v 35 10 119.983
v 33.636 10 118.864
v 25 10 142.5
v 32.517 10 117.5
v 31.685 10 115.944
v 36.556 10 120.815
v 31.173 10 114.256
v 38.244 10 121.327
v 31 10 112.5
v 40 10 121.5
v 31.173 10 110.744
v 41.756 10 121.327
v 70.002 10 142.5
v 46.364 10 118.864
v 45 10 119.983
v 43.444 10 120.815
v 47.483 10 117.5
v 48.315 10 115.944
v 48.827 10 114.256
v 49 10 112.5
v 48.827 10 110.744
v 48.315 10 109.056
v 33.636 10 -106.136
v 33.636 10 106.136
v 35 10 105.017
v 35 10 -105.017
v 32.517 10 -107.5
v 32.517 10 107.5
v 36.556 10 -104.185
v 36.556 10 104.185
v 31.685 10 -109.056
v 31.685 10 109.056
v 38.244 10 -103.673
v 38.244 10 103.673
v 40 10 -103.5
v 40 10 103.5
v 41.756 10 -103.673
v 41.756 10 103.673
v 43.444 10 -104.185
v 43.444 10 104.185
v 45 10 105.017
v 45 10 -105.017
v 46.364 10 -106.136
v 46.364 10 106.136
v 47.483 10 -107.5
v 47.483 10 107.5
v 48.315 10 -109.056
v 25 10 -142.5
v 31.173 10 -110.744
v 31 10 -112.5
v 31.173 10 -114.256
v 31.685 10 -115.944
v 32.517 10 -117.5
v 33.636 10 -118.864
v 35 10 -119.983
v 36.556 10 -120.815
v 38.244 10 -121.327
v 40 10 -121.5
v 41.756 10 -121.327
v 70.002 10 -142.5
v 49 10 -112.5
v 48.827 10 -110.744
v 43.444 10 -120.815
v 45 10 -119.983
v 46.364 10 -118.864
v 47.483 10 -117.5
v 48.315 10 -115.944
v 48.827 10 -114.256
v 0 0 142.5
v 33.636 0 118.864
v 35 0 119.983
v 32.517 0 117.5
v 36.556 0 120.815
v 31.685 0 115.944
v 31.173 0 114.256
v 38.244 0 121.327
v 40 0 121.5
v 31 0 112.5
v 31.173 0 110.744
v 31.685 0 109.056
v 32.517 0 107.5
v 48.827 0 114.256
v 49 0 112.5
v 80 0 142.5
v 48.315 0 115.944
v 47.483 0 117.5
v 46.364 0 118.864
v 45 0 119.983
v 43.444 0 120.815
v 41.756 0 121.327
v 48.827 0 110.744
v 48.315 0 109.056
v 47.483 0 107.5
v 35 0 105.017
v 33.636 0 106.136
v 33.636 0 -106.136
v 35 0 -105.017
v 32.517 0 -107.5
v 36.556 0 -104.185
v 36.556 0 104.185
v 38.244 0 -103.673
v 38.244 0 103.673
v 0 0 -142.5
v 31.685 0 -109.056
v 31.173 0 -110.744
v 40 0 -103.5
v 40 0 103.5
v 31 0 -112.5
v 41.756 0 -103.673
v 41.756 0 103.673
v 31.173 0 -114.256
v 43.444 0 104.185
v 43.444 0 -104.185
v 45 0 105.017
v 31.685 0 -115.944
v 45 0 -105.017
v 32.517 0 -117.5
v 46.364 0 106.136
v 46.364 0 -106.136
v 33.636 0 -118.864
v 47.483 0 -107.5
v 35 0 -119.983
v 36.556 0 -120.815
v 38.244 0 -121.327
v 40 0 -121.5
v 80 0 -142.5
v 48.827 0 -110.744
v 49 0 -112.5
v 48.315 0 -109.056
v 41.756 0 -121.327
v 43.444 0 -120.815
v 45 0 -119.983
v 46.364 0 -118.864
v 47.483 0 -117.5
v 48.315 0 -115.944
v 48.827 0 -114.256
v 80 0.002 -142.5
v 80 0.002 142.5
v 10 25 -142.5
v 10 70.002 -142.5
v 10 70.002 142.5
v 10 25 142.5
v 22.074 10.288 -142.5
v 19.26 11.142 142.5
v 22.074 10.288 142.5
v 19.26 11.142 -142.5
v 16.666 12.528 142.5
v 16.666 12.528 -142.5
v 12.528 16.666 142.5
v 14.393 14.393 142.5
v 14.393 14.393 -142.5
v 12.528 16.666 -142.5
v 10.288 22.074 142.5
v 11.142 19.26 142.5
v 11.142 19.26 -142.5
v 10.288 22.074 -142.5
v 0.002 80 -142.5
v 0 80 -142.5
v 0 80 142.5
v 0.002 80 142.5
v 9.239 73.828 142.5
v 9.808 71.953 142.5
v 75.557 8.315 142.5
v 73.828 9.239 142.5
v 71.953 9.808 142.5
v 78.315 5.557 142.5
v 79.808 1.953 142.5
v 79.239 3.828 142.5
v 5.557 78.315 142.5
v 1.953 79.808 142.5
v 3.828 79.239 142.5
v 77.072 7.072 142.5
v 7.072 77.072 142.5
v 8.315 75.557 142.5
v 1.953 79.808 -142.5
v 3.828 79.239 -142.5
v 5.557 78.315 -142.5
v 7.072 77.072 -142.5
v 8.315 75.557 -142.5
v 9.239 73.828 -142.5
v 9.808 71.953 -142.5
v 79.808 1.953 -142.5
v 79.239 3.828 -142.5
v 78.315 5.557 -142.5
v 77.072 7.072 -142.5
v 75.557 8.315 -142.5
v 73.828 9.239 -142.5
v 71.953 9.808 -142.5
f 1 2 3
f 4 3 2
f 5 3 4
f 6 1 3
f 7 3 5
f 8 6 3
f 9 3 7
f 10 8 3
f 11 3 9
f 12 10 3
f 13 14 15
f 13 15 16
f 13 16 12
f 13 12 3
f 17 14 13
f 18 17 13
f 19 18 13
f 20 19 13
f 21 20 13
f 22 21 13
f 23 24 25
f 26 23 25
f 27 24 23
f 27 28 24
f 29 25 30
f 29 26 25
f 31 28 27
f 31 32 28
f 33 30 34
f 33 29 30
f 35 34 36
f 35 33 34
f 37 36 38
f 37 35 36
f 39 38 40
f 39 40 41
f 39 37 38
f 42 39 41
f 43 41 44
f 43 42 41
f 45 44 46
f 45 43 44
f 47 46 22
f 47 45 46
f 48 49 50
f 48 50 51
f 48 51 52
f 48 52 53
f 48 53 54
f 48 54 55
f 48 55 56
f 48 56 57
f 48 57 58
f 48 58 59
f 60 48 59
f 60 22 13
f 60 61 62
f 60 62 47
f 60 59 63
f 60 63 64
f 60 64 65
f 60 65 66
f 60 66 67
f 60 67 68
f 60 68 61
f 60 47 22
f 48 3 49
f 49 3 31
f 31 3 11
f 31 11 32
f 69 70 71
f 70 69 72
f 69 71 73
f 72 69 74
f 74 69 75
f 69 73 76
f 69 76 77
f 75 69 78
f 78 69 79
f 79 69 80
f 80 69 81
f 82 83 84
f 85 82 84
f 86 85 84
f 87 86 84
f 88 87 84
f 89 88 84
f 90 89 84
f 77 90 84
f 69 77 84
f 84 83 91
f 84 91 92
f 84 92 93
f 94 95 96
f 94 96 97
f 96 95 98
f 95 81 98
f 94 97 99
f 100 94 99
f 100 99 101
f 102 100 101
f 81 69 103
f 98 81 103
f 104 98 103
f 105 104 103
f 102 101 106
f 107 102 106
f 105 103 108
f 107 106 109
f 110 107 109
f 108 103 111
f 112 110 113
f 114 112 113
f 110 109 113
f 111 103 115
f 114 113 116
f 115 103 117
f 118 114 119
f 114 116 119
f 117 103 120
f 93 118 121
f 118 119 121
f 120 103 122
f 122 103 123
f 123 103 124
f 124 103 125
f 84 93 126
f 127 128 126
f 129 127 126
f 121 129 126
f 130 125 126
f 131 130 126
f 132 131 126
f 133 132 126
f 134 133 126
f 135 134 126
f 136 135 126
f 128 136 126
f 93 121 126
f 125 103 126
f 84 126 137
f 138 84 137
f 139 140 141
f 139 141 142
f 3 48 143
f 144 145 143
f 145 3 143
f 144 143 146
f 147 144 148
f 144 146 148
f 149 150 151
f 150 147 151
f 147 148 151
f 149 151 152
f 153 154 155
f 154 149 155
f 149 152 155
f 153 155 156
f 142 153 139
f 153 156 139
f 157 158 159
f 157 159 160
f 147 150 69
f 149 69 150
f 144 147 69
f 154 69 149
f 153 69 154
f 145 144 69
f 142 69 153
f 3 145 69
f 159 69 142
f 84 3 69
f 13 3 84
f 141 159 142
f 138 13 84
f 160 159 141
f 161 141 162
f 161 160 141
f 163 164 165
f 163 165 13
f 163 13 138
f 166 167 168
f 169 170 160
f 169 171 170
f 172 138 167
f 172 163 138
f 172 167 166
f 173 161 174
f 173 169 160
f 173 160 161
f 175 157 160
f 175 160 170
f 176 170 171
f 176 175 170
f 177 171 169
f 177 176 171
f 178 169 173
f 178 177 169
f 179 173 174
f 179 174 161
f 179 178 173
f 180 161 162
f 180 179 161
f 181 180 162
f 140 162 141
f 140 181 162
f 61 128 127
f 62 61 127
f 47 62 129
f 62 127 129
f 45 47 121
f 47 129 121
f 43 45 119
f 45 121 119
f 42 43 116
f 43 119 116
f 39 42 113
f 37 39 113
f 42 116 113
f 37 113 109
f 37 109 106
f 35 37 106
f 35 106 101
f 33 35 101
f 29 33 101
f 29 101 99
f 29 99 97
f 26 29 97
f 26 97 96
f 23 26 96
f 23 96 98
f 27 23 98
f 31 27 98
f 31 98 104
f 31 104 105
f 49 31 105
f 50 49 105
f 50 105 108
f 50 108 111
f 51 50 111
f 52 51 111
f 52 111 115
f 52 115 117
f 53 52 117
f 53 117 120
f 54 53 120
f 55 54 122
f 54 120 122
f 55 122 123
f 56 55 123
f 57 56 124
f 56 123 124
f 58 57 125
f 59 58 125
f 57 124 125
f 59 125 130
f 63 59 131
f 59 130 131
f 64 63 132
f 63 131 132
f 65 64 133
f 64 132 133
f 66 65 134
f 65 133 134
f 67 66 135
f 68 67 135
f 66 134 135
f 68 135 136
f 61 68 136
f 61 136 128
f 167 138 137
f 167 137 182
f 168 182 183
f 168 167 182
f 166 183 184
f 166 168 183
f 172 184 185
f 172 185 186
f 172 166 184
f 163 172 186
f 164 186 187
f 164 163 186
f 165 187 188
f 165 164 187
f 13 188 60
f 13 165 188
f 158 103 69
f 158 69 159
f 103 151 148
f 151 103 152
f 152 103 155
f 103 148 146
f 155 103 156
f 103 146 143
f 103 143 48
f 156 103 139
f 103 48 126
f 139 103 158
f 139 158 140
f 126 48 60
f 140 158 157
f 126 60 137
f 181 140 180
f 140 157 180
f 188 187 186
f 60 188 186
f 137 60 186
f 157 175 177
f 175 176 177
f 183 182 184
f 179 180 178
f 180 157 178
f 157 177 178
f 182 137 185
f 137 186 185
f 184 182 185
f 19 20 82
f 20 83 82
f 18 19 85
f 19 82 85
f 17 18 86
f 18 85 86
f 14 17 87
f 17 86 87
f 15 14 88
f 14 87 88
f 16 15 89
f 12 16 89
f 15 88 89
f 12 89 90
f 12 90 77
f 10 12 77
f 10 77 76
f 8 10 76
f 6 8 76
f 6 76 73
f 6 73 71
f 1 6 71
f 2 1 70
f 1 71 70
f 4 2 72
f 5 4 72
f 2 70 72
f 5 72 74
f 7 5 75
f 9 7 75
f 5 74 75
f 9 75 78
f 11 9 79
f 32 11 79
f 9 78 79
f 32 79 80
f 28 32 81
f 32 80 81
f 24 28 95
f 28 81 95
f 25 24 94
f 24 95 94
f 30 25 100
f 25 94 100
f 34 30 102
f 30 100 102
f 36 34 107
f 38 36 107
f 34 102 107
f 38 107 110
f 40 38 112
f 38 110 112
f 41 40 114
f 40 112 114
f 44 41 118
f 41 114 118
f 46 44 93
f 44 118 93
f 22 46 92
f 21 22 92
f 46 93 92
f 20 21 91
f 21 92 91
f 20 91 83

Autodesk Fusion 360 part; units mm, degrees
sketch "Sketch1" plane through (0, 0, 0) normal (0, 0, 1) x (1, 0, 0)
  line L0 (0, 0) -> (80, 0)
  line L1 (0, 0) -> (0, 80)
  line L2 (0, 80) -> (10, 80)
  line L3 (80, 0) -> (80, 10)
  line L4 (10, 80) -> (10, 10)
  line L5 (10, 10) -> (80, 10)
  dimension "d1" = 80
  dimension "d2" = 80
  dimension "d3" = 10
  dimension "d4" = 10
extrude "Extrude1" add sketch "Sketch1" along normal mid plane 285
fillet "Fillet1" radius 10 2 edges at (80, 10, 0) (10, 80, 0)
fillet "Fillet2" radius 15 1 edges at (10, 10, 0)
sketch "Sketch2" plane through (0, 0, 0) normal (0, -1, 0) x (1, 0, 0)
  line L0 (80, -142.5) -> (80, 142.5)
  line L1 (80, 142.5) -> (0, 142.5)
  line L2 (0, 142.5) -> (0, -142.5)
  line L3 (0, -142.5) -> (80, -142.5)
  circle A0 centre (40, 112.5) radius 9
  line L4 (25, -142.5) -> (70, -142.5)
  line L5 (40, 142.5) -> (40, -142.5) construction
  line L6 (40, 142.5) -> (40, 112.5) construction
  line L7 (0, 0) -> (80, 0) construction
  circle A1 centre (40, -112.5) radius 9
  dimension "d9" = 18
  dimension "d10" = 30
extrude "Extrude2" cut sketch "Sketch2" against normal through all contours A0 | A1
